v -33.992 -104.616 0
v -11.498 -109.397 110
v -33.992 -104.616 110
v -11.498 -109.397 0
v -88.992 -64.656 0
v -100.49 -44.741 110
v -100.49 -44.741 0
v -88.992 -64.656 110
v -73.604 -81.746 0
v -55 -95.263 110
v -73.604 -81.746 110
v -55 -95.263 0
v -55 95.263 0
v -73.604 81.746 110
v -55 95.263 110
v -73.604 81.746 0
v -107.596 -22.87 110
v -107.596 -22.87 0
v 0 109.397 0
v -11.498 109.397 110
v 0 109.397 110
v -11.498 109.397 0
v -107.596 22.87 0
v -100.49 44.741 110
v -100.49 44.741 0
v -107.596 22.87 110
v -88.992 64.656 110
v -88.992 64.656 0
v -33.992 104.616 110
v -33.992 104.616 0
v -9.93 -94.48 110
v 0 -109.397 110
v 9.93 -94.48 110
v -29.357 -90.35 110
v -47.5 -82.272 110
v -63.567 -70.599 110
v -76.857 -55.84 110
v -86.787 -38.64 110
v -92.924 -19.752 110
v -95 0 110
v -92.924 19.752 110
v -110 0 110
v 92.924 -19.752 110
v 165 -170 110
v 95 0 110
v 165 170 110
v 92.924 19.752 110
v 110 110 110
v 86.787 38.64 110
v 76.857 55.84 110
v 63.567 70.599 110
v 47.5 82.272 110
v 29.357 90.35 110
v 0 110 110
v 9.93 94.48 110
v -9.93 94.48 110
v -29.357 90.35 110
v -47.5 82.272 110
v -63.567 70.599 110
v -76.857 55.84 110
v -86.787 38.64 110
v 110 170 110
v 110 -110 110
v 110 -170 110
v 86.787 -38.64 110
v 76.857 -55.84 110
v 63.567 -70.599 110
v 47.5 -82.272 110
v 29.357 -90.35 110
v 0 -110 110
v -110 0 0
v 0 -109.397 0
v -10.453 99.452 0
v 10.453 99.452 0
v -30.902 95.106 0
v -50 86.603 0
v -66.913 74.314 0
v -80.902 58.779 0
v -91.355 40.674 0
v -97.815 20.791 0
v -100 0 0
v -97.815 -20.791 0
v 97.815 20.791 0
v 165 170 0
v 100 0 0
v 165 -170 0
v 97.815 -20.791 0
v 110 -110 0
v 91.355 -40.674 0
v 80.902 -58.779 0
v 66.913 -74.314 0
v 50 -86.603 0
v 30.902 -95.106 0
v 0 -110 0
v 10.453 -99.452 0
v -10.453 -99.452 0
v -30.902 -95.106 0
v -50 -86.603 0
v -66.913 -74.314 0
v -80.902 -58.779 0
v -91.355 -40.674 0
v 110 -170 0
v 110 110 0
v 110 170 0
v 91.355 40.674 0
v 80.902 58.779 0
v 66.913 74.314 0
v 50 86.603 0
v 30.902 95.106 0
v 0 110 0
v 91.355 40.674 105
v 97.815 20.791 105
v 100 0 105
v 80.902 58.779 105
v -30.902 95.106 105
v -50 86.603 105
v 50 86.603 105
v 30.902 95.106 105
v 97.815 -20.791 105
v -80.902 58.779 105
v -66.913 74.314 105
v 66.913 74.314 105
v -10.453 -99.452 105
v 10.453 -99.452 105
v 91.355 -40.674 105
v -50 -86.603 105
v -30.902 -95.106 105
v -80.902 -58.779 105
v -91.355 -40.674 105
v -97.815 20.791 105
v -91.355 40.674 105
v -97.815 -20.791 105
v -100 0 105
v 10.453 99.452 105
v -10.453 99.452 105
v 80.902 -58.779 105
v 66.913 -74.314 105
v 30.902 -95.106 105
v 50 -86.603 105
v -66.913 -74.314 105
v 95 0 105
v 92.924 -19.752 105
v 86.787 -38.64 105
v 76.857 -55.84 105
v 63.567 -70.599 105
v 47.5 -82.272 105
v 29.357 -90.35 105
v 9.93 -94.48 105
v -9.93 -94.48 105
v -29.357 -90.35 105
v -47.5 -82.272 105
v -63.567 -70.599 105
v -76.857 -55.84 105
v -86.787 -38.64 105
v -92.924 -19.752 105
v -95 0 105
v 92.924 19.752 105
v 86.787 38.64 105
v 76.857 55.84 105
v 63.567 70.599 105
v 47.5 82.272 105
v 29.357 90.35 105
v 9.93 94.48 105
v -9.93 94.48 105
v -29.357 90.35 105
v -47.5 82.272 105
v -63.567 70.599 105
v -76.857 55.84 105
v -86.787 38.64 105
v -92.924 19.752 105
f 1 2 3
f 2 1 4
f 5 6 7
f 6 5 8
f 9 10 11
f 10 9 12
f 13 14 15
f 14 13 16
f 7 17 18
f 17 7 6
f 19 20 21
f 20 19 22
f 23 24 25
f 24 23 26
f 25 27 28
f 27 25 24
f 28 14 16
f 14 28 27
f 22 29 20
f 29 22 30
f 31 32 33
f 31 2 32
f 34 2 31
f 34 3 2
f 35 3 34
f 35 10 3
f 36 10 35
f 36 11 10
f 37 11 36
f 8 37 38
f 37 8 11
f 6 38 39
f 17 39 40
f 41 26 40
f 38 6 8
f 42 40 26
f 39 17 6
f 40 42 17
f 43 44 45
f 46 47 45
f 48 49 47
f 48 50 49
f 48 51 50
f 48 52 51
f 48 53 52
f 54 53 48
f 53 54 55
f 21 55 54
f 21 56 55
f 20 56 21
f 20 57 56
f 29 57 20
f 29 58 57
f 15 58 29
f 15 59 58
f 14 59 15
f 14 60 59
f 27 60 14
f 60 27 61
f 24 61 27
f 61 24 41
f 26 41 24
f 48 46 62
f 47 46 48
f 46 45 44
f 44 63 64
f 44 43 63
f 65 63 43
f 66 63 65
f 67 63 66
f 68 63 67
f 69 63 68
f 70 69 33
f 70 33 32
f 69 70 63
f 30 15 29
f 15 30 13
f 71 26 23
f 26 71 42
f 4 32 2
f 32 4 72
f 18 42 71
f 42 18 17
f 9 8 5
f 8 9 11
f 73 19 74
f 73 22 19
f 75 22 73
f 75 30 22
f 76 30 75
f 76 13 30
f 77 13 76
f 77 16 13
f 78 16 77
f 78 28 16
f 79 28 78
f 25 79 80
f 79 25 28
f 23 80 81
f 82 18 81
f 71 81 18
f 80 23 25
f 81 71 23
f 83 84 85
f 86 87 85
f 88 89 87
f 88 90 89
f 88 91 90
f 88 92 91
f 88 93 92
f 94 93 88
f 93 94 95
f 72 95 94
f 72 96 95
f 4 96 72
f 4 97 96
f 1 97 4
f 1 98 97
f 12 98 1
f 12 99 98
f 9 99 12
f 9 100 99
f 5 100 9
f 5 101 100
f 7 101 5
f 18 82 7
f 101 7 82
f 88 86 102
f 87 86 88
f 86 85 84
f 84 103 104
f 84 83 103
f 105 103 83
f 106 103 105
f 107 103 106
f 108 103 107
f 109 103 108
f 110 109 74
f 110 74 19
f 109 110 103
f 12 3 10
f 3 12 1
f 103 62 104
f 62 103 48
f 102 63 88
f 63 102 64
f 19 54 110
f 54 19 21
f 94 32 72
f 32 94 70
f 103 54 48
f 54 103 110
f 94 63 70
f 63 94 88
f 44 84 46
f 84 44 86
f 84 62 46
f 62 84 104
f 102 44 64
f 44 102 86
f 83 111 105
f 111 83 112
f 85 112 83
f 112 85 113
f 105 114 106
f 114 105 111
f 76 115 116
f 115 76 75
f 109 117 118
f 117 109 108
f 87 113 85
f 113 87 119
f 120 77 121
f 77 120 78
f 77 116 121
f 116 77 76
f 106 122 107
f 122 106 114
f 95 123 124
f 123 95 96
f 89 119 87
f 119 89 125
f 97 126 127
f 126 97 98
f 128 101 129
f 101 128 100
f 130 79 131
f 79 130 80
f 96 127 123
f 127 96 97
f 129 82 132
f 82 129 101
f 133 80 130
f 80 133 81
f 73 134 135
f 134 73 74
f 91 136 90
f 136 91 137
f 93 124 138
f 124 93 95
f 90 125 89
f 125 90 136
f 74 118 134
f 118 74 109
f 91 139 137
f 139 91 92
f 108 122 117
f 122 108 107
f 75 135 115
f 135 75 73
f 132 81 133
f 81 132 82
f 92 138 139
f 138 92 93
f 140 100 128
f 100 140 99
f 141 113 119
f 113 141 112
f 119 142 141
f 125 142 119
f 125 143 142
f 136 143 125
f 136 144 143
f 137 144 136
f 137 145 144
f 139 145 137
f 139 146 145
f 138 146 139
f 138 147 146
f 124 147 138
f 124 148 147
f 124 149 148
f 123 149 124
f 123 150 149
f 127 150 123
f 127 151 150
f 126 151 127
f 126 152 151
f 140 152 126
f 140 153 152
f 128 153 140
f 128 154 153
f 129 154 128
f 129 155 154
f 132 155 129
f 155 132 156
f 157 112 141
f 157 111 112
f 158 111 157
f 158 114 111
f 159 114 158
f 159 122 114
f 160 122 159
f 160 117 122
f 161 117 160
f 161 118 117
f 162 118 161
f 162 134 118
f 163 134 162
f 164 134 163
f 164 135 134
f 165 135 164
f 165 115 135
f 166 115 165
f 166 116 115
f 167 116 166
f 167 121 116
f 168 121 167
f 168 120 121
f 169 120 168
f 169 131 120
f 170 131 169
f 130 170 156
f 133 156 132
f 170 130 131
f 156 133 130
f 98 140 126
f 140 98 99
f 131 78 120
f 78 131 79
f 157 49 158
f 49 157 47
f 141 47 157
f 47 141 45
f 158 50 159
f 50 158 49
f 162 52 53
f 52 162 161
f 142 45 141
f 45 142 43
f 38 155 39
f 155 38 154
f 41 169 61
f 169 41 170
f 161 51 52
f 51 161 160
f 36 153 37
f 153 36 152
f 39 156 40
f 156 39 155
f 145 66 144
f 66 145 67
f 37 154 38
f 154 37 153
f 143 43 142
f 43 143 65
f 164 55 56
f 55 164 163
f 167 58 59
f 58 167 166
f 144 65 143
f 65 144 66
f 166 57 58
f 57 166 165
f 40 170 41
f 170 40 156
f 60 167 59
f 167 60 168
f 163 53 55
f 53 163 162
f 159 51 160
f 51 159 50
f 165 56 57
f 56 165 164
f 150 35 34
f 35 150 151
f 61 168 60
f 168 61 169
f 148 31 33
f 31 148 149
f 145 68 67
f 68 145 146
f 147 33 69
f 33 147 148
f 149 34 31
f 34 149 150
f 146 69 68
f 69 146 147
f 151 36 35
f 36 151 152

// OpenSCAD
//Outer Radius of Bearing to be Used
BearingOuterRad=100;
//Thickness of Bearing to be Used
BearingThickness=100;
//Radius of Bolt Head For Fastening
BoltHeadRadius=15;


//Driven Variables
    //Main Body Dimensions
MainBodyCylThickness=BearingThickness+10;
MainBodyCylRad=BearingOuterRad+10;

    //Bearing Support Block Dimensions
BearingSupportBlockHeightX=MainBodyCylRad;
BearingSupportBlockLengthY=2*MainBodyCylRad;
BearingSupportBlockThickZ=MainBodyCylThickness;
BearingSupportBlockYshift=-1*MainBodyCylRad;

    //Bolt Flange Block Dimensions
FlangeHeightX=.5*MainBodyCylRad;
FlangeLengthY=2*MainBodyCylRad+8*BoltHeadRadius;
FlangeThickZ=MainBodyCylThickness;
FlangeBlockXshift=MainBodyCylRad;
FlangeBlockYshift=-.5*FlangeLengthY;

    //Bearing Seat Dimensions
BearingSeatRad=BearingOuterRad;
BearingSeatThickness=MainBodyCylThickness-4;
    
    //Main Cut Out Dimensions
MainCutOutRadius=BearingOuterRad-5;
MainCutOutThickness=MainBodyCylThickness+1;
    
    

//This Difference Subtracts the Main Cutout From the Pillow Block
difference(){

//This Difference Subtracts the BearingSeat From the Pillow Block
difference(){

//This Union Unites Main Body Cylinder and Bearing Support Block to Flange Block
union(){
    
//This Union Unites Main Body Cylinder with Bearing Support Block
union(){

//Main Body Cylinder
translate([0,0,0])rotate([0,0,0])cylinder(MainBodyCylThickness,MainBodyCylRad,MainBodyCylRad);

//Bearing Support Block
translate([0,BearingSupportBlockYshift,0])rotate([0,0,0])cube([BearingSupportBlockHeightX,BearingSupportBlockLengthY,BearingSupportBlockThickZ]);
    
};


//Flange Block
translate([FlangeBlockXshift,FlangeBlockYshift,0])rotate([0,0,0])cube([FlangeHeightX,FlangeLengthY,FlangeThickZ]);

};

//Bearing Seat
translate([0,0,-1])rotate([0,0,0])cylinder(BearingSeatThickness,BearingSeatRad,BearingSeatRad);

};

//Main Cut Out
translate([0,0,0])rotate([0,0,0])cylinder(MainCutOutThickness,MainCutOutRadius,MainCutOutRadius);
};
